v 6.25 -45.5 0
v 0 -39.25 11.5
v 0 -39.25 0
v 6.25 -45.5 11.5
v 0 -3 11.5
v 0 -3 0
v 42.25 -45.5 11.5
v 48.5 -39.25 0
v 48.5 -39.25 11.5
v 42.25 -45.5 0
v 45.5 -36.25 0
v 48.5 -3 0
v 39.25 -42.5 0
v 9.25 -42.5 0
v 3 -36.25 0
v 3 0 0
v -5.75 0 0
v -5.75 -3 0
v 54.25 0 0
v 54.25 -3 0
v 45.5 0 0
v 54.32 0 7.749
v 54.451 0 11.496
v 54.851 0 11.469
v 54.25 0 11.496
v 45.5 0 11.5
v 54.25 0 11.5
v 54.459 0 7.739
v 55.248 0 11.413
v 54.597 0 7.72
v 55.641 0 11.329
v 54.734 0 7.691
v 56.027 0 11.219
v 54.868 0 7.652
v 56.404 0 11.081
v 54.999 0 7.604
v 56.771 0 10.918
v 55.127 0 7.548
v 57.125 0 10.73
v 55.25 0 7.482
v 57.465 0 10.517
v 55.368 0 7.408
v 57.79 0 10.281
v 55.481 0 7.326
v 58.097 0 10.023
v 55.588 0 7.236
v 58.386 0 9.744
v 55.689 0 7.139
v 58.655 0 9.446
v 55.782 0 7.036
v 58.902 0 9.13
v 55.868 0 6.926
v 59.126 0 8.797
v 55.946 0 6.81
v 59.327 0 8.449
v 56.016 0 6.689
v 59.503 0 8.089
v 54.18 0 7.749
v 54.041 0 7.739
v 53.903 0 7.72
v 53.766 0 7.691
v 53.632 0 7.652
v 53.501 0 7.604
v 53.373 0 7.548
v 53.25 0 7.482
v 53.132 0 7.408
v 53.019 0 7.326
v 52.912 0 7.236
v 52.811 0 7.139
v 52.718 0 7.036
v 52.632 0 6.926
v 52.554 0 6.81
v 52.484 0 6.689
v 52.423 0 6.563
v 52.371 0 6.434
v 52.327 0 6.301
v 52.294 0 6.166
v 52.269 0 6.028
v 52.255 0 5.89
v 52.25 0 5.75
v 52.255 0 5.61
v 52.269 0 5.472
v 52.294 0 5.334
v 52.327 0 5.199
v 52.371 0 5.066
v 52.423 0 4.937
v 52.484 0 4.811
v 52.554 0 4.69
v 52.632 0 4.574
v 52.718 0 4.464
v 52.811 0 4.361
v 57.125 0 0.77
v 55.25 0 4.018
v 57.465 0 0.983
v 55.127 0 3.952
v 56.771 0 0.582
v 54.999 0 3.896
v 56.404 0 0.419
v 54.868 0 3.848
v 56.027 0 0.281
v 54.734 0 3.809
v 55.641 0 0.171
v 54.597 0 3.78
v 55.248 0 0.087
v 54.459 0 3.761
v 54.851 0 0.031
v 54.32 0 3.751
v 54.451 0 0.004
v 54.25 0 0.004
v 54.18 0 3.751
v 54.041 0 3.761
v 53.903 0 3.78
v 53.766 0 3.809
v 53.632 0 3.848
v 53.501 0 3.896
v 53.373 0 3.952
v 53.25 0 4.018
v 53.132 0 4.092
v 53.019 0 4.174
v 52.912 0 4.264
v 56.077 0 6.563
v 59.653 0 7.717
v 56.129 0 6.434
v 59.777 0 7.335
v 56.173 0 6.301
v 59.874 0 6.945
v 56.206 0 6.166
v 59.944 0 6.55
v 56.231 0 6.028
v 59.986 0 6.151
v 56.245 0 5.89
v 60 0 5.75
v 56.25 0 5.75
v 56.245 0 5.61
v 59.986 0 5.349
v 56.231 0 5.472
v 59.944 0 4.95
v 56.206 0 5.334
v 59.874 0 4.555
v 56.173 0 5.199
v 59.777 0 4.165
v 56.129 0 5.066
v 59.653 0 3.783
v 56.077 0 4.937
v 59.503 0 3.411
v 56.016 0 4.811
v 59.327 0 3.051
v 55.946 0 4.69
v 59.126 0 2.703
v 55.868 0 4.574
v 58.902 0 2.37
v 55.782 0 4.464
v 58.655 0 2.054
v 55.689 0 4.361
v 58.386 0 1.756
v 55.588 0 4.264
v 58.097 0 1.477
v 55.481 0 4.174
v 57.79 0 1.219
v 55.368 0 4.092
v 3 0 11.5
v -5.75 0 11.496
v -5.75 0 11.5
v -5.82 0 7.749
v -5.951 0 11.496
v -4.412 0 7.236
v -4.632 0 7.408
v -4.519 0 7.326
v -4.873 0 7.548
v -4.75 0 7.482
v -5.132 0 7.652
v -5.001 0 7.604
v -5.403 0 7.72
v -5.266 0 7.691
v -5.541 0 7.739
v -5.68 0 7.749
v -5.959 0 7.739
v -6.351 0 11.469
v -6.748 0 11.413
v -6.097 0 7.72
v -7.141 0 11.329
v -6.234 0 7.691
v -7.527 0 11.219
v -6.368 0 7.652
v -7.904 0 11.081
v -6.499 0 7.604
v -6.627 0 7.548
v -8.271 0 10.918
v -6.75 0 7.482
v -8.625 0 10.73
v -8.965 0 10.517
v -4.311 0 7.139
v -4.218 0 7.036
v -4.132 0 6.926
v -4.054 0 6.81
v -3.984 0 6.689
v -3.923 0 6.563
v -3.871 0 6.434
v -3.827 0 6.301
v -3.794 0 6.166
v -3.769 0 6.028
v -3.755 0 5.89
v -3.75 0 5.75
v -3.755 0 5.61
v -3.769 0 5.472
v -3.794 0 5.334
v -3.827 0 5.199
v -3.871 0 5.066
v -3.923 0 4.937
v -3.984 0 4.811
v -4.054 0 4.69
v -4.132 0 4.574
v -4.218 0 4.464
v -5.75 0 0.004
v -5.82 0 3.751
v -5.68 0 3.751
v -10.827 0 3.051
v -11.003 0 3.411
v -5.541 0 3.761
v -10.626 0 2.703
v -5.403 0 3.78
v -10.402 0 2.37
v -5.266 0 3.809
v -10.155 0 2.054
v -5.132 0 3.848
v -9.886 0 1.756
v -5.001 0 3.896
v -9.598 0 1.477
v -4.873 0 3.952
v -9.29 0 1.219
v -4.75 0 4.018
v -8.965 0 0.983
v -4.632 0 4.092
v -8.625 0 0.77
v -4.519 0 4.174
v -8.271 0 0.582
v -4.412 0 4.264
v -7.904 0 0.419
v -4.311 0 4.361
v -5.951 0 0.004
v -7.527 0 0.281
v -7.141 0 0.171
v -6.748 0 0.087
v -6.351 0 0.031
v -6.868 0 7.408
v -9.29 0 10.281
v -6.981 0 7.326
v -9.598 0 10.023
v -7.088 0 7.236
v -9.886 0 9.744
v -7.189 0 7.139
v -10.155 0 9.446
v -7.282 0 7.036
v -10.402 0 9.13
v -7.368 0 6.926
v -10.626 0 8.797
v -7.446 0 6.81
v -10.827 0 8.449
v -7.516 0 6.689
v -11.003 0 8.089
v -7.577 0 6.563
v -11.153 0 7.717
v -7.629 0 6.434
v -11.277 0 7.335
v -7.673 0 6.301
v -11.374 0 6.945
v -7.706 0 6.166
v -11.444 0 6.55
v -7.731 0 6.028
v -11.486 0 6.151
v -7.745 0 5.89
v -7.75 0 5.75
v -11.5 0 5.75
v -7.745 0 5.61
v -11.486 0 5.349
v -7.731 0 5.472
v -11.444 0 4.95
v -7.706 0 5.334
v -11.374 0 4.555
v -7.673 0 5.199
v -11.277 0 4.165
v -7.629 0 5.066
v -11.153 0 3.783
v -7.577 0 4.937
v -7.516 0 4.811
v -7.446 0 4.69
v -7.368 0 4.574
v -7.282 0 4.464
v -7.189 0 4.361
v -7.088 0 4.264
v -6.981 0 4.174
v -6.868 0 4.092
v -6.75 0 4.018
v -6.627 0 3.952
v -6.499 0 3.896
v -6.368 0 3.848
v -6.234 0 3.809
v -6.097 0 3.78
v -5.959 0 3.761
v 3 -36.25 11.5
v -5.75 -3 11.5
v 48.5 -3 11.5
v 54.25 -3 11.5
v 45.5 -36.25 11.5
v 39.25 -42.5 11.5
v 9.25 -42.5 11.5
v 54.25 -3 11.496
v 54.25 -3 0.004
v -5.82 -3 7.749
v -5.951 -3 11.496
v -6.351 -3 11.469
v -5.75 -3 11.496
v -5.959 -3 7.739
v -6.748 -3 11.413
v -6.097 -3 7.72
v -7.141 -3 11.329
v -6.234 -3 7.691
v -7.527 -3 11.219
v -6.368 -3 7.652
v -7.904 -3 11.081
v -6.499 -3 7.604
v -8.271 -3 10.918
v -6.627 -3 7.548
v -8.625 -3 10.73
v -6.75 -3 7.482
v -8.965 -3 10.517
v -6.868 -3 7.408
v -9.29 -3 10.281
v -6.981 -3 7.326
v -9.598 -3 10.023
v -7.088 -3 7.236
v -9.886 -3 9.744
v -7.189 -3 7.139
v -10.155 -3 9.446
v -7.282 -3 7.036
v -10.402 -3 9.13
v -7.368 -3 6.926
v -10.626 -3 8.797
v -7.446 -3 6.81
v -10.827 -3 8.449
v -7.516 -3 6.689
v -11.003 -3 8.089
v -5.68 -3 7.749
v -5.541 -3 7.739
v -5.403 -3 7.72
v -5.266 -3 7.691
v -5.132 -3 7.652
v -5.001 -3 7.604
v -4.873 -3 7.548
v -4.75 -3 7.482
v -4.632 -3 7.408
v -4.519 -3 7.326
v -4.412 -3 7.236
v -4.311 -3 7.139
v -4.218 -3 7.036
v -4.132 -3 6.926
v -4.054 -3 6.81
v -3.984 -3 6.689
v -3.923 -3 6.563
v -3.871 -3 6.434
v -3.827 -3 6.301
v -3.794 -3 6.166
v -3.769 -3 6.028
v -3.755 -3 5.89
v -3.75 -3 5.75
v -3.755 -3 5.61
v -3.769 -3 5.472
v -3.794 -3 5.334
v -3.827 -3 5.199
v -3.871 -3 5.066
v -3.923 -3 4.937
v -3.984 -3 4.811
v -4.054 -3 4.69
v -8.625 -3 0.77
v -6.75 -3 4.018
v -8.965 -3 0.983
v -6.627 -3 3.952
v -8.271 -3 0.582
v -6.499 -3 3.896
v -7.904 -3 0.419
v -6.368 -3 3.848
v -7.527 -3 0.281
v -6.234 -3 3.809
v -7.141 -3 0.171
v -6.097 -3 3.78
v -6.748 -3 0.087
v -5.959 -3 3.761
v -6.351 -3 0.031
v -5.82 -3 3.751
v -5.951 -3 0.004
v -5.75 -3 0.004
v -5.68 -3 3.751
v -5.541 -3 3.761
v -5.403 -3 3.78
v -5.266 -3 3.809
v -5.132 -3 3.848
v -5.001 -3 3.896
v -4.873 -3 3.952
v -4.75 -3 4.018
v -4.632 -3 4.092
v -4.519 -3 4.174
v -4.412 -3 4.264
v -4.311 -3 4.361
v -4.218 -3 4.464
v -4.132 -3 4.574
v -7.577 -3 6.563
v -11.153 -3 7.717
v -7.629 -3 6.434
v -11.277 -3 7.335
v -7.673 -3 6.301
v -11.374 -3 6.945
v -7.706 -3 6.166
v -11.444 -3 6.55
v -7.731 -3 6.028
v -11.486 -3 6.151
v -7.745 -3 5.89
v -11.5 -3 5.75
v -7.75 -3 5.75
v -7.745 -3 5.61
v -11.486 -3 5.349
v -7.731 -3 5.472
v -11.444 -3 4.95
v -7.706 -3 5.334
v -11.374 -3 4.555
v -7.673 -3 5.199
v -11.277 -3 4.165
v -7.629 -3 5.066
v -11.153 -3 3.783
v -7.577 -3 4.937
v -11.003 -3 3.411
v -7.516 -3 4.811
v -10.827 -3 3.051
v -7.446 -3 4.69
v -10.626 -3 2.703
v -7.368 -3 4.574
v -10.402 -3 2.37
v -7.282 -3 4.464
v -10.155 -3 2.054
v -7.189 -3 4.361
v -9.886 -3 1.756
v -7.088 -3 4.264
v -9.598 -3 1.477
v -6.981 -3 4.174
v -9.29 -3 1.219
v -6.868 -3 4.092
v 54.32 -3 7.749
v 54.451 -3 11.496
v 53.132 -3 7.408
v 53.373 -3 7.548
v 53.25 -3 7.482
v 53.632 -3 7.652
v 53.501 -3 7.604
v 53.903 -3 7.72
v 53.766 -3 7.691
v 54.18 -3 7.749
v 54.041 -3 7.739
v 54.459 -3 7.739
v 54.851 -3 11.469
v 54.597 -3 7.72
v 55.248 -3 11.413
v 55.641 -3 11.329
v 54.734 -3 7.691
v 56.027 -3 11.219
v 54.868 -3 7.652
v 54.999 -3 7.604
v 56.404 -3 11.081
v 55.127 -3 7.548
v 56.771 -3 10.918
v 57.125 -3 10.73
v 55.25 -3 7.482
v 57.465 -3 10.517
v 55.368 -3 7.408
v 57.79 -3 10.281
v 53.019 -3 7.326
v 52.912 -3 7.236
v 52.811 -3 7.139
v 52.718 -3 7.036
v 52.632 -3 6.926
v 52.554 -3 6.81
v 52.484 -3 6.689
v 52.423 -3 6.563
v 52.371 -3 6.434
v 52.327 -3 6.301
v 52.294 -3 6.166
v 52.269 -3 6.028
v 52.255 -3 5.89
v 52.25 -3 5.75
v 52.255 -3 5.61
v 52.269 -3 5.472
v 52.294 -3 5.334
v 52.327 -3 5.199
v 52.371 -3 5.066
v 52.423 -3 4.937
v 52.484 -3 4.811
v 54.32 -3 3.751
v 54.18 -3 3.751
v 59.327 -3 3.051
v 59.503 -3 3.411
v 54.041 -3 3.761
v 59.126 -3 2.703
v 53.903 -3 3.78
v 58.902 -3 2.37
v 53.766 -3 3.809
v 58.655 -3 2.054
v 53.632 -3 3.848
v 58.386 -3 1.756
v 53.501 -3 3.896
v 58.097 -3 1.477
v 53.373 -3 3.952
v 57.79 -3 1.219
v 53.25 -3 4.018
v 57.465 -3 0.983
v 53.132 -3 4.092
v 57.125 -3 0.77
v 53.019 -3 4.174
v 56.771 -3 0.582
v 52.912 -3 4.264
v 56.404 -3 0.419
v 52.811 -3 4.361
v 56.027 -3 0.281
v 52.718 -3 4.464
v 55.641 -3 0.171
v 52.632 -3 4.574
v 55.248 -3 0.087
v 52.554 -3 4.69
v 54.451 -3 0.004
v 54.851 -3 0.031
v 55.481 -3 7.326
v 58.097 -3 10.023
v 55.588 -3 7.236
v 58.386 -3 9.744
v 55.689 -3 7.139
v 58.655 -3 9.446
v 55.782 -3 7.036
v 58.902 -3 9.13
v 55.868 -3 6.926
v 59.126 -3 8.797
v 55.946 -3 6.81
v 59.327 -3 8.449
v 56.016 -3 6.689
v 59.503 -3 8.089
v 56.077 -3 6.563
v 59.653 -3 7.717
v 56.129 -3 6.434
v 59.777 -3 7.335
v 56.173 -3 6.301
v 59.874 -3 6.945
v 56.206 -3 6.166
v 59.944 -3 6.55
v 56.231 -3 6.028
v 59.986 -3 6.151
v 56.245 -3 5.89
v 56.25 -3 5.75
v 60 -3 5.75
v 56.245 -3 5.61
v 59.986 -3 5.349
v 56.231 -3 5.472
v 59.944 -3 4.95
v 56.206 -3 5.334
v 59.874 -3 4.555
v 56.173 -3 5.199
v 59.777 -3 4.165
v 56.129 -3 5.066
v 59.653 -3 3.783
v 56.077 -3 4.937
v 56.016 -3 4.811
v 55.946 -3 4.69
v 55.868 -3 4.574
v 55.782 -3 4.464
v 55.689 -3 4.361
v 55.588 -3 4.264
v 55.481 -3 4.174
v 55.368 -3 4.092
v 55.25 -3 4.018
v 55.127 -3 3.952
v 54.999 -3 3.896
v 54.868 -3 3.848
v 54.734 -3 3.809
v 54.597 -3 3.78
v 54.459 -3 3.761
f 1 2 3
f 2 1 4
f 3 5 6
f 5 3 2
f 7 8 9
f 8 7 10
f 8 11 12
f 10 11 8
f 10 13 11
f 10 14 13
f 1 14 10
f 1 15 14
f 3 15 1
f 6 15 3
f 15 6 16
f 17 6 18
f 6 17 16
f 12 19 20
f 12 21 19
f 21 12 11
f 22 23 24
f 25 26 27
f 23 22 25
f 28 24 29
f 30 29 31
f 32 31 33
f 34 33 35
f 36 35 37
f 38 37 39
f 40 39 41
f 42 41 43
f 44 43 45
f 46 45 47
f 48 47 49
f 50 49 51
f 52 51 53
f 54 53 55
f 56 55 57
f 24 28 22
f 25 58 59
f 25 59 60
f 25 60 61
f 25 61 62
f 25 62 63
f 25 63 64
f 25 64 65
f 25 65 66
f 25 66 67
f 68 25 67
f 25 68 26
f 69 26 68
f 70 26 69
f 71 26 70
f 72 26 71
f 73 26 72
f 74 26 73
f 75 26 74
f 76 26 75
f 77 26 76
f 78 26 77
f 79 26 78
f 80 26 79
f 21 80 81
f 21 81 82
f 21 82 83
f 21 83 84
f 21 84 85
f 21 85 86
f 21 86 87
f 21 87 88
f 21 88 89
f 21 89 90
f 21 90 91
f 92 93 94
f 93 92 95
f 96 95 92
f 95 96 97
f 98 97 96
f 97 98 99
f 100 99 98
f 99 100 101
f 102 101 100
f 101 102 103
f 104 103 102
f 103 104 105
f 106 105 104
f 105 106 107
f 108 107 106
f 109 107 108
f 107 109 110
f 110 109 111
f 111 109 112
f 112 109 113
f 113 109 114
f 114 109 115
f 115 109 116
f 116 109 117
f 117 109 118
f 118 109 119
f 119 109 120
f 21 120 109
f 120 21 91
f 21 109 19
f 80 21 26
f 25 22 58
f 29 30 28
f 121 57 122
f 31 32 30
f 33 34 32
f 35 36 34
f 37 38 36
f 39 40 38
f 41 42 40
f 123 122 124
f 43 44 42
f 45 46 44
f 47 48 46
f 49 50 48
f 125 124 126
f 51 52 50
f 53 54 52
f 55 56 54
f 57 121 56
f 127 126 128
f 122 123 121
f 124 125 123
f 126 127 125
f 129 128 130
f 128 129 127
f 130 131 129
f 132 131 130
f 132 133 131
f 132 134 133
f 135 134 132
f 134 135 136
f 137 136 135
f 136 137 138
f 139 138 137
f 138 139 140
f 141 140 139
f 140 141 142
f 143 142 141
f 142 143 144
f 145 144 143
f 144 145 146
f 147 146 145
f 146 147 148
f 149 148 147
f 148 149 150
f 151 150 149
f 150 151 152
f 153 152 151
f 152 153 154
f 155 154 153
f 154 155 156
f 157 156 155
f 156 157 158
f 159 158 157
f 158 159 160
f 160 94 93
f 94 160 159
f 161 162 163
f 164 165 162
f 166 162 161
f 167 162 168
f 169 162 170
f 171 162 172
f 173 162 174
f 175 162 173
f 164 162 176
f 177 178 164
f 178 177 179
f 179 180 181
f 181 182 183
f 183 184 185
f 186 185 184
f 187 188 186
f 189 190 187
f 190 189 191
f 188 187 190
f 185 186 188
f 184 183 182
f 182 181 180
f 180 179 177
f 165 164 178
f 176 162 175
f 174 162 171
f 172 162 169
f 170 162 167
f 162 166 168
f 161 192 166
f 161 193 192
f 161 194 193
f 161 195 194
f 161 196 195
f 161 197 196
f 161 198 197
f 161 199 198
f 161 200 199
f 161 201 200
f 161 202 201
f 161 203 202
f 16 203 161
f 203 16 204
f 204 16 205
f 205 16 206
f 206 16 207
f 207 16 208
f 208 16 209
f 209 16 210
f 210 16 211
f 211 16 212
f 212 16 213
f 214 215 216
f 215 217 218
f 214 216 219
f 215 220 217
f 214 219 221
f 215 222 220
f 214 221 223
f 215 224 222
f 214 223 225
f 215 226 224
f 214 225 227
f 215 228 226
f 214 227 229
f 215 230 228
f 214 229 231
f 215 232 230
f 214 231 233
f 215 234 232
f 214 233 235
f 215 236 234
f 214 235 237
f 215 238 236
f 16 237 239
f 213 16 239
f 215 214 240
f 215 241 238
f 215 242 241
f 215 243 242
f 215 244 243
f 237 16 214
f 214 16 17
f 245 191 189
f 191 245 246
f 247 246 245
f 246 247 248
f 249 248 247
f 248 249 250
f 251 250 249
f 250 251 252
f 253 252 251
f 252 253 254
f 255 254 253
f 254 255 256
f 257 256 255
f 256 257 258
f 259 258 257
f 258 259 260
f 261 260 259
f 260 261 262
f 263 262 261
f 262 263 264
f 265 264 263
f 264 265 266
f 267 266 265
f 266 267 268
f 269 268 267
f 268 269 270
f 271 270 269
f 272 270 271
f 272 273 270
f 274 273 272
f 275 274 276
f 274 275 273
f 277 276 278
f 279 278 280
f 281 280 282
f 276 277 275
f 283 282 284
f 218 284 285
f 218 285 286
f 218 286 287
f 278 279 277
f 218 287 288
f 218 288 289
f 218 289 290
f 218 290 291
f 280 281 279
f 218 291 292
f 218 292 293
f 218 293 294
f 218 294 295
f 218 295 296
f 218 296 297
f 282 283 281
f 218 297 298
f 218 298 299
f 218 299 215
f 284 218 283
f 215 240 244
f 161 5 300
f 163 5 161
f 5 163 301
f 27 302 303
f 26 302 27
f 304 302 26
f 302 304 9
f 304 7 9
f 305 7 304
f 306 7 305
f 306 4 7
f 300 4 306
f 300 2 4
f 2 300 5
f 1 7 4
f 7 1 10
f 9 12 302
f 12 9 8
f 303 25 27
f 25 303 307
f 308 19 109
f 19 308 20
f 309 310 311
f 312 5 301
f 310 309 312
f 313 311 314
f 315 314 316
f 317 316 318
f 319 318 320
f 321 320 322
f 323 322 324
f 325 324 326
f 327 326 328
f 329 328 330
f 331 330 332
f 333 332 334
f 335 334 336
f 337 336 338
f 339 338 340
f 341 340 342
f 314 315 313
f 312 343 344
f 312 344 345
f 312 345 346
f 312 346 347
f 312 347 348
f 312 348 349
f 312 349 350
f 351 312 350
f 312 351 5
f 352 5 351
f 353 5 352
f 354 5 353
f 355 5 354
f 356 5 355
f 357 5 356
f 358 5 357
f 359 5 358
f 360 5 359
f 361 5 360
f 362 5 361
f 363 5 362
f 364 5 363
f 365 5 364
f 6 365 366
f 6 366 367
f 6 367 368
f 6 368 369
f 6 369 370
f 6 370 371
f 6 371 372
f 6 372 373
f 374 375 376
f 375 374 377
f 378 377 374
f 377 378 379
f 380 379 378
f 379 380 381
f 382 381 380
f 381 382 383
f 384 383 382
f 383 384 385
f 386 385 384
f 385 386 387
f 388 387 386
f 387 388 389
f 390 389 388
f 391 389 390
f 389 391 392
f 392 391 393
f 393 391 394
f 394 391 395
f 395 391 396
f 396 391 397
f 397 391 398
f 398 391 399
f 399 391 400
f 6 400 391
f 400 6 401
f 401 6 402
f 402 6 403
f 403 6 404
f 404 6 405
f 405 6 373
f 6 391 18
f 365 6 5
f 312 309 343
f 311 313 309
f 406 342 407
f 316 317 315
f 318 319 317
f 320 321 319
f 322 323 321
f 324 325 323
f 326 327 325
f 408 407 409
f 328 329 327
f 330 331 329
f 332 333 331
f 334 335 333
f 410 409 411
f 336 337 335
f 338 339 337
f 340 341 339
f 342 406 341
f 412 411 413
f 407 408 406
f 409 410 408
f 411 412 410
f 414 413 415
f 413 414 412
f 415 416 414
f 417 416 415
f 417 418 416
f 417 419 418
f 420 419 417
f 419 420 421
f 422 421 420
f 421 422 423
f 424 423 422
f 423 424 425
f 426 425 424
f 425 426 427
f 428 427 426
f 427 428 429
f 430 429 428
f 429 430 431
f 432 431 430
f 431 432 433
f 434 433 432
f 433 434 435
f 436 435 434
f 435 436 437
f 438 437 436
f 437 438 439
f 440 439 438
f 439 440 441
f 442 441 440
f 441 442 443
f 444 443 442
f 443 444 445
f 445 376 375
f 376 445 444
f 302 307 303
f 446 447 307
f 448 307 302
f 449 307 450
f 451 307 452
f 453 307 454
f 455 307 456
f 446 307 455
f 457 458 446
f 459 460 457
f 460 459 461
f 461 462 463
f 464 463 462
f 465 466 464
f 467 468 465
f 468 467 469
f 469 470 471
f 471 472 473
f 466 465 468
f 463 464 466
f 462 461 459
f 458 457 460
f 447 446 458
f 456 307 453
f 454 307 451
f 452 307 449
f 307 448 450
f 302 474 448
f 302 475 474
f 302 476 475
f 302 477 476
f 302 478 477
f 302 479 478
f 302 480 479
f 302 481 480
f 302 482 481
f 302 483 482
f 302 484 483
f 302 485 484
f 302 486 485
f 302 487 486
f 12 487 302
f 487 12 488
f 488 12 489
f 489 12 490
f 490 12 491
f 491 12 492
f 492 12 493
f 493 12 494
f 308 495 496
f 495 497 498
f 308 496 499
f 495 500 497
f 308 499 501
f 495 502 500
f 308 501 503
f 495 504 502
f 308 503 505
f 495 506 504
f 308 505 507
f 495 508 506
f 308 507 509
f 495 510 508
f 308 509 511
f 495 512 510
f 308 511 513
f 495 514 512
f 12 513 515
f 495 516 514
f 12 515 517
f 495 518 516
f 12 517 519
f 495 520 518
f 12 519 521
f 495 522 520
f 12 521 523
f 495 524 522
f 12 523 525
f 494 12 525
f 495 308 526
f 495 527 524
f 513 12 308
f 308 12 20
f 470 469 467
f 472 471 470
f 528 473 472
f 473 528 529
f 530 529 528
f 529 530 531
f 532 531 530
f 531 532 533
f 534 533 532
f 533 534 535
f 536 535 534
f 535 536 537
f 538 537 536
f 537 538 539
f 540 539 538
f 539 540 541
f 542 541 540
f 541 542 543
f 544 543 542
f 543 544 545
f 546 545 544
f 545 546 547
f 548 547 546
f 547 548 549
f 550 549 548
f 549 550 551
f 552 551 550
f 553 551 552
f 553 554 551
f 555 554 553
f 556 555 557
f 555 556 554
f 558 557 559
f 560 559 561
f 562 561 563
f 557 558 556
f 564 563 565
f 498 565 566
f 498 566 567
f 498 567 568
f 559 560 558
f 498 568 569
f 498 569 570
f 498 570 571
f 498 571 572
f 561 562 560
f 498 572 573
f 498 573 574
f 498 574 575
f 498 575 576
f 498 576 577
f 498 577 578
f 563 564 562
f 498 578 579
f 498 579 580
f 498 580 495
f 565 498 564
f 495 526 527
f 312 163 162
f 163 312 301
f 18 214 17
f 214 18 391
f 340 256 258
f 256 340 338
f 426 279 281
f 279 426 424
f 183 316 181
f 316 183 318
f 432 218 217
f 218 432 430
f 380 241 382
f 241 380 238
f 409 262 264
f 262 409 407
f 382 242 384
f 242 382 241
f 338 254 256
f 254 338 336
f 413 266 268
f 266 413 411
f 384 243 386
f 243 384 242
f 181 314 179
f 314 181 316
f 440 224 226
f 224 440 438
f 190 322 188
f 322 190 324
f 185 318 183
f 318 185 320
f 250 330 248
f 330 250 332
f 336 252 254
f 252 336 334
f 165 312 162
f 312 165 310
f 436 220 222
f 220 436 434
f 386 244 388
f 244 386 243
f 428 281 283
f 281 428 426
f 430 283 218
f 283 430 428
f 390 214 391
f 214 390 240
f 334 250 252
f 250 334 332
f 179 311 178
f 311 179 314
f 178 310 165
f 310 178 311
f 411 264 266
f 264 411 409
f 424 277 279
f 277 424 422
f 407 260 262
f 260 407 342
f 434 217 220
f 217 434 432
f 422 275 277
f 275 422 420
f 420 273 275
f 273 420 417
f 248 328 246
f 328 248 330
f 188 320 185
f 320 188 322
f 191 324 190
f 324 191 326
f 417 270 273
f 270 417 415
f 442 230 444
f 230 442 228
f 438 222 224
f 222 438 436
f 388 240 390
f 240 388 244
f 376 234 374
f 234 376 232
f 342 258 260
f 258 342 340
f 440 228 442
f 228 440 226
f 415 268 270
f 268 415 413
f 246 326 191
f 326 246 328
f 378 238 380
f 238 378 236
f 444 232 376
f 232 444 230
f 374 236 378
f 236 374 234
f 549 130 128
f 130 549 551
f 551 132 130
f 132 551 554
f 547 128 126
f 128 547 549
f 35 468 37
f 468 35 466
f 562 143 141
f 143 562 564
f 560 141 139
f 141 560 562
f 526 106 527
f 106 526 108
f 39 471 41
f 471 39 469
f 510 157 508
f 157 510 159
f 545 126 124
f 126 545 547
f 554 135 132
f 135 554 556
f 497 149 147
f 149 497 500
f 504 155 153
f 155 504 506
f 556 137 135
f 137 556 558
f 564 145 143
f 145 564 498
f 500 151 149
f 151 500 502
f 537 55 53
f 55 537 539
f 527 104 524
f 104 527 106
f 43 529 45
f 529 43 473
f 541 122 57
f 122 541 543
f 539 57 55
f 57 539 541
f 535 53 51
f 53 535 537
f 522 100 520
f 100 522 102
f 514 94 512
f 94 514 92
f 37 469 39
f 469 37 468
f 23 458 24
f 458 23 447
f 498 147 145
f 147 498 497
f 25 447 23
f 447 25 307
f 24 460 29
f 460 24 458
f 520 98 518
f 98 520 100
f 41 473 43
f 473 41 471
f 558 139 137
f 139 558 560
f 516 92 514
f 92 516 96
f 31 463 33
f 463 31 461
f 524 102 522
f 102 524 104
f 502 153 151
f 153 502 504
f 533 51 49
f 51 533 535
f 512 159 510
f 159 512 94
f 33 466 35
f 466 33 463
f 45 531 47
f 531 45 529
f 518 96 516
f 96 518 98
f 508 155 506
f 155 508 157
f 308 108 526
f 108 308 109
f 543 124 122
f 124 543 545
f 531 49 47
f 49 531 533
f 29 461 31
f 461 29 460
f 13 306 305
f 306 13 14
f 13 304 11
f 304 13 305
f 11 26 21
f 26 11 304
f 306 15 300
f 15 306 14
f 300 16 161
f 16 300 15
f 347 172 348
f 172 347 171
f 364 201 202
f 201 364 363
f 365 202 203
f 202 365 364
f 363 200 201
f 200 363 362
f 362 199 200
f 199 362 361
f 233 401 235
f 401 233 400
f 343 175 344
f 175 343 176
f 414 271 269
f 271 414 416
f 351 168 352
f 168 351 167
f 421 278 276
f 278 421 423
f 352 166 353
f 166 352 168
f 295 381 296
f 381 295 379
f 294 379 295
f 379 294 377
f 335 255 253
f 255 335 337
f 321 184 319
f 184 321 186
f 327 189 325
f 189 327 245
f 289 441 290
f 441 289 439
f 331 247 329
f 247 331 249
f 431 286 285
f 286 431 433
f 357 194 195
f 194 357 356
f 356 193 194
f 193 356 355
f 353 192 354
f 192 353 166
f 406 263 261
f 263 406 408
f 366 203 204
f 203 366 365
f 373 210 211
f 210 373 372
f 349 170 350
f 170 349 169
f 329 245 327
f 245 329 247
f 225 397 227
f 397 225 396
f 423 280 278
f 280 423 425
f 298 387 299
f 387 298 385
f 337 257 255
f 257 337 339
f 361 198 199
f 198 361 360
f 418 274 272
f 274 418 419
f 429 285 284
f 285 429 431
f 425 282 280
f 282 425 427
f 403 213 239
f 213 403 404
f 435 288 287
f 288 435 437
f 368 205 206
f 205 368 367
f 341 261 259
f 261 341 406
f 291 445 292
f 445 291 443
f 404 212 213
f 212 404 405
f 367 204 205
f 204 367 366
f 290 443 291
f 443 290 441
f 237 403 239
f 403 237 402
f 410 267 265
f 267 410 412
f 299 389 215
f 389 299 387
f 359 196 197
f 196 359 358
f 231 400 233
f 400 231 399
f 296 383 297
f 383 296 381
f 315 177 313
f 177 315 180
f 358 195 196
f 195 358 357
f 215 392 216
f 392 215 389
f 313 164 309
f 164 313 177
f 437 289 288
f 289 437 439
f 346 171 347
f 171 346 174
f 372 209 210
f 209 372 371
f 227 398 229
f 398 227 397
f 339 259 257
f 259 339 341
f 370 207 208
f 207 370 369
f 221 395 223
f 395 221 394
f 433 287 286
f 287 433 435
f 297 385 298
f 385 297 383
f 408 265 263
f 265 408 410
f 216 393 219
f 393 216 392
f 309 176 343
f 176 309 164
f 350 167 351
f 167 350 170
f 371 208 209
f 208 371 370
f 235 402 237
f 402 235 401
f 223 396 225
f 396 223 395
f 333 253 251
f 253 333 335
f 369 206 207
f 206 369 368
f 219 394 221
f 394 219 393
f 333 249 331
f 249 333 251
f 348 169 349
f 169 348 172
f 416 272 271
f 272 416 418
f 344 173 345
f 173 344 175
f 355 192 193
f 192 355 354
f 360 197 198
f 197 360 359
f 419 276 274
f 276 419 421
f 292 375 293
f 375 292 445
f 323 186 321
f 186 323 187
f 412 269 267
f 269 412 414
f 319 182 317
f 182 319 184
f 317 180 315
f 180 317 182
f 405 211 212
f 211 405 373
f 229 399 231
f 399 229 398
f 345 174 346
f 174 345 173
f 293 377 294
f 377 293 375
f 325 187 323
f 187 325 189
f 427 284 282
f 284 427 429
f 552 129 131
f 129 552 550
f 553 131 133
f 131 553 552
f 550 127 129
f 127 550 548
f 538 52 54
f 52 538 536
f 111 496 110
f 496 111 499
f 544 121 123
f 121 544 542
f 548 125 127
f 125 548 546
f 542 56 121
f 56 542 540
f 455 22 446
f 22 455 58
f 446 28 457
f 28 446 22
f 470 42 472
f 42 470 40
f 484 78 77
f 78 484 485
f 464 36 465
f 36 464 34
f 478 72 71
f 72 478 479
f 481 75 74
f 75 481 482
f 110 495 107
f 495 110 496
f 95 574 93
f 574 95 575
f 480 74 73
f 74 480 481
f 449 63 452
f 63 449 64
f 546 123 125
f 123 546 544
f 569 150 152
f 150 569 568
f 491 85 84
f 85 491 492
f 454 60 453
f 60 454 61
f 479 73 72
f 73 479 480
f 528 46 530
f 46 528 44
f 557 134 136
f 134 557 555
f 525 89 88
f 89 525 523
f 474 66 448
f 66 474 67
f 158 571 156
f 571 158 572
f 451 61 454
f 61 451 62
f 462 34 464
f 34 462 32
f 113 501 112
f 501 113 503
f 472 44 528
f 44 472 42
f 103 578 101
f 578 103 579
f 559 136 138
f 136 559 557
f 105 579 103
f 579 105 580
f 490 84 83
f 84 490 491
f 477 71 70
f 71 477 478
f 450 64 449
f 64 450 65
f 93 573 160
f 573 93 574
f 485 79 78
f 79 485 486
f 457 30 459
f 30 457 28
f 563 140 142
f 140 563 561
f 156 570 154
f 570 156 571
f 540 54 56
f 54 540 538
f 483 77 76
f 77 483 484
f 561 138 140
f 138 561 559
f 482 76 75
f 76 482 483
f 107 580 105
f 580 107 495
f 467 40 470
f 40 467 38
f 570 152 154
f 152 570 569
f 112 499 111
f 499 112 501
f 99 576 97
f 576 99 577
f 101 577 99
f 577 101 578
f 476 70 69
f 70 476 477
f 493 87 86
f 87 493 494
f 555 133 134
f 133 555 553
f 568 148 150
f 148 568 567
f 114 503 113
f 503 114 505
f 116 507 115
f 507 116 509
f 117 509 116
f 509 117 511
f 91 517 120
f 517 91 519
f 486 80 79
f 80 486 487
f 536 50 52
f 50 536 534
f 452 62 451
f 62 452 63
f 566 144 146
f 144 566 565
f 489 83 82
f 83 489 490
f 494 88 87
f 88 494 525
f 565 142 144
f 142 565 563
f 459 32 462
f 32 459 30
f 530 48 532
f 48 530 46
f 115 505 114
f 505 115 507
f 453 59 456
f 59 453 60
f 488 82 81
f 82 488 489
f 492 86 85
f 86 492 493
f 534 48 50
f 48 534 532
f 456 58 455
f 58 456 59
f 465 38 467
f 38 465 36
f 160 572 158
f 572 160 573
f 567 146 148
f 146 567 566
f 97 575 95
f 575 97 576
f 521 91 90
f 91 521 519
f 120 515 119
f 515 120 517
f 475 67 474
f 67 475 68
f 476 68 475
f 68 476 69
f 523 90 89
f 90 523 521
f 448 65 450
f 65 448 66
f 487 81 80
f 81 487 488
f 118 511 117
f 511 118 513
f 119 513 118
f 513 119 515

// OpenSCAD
motor=42.5;
corner=12.5;
band=11.5;
wall=3;
screw=4;
pad=0.1;
padd=pad*2;
$fn=90;


rotate([90,0,0])
difference() {
    union() {
        hull() {
            translate([corner/2,0,0])
            cube([motor+wall*2-corner,band,motor+wall]);
            cube([motor+wall*2,band,motor+wall-corner/2]);
        }
        translate([-band/2,0,0])
        cube([motor+wall*2+band,band,wall]);
        translate([-band/2,band/2,0])
        cylinder(h=wall,d=band);
        translate([motor+wall*2+band/2,band/2,0])
        cylinder(h=wall,d=band);
    }
    translate([wall,-pad,-pad])
    hull() {
        cube([motor,band+padd,motor-corner/2+pad]);
        translate([corner/2,0,0])
        cube([motor-corner,band+padd,motor+pad]);
    }
    translate([-band/2,band/2,-pad])
    cylinder(d=screw,h=wall+padd);
    translate([motor+wall*2+band/2,band/2,-pad])
    cylinder(d=screw,h=wall+padd);
}
